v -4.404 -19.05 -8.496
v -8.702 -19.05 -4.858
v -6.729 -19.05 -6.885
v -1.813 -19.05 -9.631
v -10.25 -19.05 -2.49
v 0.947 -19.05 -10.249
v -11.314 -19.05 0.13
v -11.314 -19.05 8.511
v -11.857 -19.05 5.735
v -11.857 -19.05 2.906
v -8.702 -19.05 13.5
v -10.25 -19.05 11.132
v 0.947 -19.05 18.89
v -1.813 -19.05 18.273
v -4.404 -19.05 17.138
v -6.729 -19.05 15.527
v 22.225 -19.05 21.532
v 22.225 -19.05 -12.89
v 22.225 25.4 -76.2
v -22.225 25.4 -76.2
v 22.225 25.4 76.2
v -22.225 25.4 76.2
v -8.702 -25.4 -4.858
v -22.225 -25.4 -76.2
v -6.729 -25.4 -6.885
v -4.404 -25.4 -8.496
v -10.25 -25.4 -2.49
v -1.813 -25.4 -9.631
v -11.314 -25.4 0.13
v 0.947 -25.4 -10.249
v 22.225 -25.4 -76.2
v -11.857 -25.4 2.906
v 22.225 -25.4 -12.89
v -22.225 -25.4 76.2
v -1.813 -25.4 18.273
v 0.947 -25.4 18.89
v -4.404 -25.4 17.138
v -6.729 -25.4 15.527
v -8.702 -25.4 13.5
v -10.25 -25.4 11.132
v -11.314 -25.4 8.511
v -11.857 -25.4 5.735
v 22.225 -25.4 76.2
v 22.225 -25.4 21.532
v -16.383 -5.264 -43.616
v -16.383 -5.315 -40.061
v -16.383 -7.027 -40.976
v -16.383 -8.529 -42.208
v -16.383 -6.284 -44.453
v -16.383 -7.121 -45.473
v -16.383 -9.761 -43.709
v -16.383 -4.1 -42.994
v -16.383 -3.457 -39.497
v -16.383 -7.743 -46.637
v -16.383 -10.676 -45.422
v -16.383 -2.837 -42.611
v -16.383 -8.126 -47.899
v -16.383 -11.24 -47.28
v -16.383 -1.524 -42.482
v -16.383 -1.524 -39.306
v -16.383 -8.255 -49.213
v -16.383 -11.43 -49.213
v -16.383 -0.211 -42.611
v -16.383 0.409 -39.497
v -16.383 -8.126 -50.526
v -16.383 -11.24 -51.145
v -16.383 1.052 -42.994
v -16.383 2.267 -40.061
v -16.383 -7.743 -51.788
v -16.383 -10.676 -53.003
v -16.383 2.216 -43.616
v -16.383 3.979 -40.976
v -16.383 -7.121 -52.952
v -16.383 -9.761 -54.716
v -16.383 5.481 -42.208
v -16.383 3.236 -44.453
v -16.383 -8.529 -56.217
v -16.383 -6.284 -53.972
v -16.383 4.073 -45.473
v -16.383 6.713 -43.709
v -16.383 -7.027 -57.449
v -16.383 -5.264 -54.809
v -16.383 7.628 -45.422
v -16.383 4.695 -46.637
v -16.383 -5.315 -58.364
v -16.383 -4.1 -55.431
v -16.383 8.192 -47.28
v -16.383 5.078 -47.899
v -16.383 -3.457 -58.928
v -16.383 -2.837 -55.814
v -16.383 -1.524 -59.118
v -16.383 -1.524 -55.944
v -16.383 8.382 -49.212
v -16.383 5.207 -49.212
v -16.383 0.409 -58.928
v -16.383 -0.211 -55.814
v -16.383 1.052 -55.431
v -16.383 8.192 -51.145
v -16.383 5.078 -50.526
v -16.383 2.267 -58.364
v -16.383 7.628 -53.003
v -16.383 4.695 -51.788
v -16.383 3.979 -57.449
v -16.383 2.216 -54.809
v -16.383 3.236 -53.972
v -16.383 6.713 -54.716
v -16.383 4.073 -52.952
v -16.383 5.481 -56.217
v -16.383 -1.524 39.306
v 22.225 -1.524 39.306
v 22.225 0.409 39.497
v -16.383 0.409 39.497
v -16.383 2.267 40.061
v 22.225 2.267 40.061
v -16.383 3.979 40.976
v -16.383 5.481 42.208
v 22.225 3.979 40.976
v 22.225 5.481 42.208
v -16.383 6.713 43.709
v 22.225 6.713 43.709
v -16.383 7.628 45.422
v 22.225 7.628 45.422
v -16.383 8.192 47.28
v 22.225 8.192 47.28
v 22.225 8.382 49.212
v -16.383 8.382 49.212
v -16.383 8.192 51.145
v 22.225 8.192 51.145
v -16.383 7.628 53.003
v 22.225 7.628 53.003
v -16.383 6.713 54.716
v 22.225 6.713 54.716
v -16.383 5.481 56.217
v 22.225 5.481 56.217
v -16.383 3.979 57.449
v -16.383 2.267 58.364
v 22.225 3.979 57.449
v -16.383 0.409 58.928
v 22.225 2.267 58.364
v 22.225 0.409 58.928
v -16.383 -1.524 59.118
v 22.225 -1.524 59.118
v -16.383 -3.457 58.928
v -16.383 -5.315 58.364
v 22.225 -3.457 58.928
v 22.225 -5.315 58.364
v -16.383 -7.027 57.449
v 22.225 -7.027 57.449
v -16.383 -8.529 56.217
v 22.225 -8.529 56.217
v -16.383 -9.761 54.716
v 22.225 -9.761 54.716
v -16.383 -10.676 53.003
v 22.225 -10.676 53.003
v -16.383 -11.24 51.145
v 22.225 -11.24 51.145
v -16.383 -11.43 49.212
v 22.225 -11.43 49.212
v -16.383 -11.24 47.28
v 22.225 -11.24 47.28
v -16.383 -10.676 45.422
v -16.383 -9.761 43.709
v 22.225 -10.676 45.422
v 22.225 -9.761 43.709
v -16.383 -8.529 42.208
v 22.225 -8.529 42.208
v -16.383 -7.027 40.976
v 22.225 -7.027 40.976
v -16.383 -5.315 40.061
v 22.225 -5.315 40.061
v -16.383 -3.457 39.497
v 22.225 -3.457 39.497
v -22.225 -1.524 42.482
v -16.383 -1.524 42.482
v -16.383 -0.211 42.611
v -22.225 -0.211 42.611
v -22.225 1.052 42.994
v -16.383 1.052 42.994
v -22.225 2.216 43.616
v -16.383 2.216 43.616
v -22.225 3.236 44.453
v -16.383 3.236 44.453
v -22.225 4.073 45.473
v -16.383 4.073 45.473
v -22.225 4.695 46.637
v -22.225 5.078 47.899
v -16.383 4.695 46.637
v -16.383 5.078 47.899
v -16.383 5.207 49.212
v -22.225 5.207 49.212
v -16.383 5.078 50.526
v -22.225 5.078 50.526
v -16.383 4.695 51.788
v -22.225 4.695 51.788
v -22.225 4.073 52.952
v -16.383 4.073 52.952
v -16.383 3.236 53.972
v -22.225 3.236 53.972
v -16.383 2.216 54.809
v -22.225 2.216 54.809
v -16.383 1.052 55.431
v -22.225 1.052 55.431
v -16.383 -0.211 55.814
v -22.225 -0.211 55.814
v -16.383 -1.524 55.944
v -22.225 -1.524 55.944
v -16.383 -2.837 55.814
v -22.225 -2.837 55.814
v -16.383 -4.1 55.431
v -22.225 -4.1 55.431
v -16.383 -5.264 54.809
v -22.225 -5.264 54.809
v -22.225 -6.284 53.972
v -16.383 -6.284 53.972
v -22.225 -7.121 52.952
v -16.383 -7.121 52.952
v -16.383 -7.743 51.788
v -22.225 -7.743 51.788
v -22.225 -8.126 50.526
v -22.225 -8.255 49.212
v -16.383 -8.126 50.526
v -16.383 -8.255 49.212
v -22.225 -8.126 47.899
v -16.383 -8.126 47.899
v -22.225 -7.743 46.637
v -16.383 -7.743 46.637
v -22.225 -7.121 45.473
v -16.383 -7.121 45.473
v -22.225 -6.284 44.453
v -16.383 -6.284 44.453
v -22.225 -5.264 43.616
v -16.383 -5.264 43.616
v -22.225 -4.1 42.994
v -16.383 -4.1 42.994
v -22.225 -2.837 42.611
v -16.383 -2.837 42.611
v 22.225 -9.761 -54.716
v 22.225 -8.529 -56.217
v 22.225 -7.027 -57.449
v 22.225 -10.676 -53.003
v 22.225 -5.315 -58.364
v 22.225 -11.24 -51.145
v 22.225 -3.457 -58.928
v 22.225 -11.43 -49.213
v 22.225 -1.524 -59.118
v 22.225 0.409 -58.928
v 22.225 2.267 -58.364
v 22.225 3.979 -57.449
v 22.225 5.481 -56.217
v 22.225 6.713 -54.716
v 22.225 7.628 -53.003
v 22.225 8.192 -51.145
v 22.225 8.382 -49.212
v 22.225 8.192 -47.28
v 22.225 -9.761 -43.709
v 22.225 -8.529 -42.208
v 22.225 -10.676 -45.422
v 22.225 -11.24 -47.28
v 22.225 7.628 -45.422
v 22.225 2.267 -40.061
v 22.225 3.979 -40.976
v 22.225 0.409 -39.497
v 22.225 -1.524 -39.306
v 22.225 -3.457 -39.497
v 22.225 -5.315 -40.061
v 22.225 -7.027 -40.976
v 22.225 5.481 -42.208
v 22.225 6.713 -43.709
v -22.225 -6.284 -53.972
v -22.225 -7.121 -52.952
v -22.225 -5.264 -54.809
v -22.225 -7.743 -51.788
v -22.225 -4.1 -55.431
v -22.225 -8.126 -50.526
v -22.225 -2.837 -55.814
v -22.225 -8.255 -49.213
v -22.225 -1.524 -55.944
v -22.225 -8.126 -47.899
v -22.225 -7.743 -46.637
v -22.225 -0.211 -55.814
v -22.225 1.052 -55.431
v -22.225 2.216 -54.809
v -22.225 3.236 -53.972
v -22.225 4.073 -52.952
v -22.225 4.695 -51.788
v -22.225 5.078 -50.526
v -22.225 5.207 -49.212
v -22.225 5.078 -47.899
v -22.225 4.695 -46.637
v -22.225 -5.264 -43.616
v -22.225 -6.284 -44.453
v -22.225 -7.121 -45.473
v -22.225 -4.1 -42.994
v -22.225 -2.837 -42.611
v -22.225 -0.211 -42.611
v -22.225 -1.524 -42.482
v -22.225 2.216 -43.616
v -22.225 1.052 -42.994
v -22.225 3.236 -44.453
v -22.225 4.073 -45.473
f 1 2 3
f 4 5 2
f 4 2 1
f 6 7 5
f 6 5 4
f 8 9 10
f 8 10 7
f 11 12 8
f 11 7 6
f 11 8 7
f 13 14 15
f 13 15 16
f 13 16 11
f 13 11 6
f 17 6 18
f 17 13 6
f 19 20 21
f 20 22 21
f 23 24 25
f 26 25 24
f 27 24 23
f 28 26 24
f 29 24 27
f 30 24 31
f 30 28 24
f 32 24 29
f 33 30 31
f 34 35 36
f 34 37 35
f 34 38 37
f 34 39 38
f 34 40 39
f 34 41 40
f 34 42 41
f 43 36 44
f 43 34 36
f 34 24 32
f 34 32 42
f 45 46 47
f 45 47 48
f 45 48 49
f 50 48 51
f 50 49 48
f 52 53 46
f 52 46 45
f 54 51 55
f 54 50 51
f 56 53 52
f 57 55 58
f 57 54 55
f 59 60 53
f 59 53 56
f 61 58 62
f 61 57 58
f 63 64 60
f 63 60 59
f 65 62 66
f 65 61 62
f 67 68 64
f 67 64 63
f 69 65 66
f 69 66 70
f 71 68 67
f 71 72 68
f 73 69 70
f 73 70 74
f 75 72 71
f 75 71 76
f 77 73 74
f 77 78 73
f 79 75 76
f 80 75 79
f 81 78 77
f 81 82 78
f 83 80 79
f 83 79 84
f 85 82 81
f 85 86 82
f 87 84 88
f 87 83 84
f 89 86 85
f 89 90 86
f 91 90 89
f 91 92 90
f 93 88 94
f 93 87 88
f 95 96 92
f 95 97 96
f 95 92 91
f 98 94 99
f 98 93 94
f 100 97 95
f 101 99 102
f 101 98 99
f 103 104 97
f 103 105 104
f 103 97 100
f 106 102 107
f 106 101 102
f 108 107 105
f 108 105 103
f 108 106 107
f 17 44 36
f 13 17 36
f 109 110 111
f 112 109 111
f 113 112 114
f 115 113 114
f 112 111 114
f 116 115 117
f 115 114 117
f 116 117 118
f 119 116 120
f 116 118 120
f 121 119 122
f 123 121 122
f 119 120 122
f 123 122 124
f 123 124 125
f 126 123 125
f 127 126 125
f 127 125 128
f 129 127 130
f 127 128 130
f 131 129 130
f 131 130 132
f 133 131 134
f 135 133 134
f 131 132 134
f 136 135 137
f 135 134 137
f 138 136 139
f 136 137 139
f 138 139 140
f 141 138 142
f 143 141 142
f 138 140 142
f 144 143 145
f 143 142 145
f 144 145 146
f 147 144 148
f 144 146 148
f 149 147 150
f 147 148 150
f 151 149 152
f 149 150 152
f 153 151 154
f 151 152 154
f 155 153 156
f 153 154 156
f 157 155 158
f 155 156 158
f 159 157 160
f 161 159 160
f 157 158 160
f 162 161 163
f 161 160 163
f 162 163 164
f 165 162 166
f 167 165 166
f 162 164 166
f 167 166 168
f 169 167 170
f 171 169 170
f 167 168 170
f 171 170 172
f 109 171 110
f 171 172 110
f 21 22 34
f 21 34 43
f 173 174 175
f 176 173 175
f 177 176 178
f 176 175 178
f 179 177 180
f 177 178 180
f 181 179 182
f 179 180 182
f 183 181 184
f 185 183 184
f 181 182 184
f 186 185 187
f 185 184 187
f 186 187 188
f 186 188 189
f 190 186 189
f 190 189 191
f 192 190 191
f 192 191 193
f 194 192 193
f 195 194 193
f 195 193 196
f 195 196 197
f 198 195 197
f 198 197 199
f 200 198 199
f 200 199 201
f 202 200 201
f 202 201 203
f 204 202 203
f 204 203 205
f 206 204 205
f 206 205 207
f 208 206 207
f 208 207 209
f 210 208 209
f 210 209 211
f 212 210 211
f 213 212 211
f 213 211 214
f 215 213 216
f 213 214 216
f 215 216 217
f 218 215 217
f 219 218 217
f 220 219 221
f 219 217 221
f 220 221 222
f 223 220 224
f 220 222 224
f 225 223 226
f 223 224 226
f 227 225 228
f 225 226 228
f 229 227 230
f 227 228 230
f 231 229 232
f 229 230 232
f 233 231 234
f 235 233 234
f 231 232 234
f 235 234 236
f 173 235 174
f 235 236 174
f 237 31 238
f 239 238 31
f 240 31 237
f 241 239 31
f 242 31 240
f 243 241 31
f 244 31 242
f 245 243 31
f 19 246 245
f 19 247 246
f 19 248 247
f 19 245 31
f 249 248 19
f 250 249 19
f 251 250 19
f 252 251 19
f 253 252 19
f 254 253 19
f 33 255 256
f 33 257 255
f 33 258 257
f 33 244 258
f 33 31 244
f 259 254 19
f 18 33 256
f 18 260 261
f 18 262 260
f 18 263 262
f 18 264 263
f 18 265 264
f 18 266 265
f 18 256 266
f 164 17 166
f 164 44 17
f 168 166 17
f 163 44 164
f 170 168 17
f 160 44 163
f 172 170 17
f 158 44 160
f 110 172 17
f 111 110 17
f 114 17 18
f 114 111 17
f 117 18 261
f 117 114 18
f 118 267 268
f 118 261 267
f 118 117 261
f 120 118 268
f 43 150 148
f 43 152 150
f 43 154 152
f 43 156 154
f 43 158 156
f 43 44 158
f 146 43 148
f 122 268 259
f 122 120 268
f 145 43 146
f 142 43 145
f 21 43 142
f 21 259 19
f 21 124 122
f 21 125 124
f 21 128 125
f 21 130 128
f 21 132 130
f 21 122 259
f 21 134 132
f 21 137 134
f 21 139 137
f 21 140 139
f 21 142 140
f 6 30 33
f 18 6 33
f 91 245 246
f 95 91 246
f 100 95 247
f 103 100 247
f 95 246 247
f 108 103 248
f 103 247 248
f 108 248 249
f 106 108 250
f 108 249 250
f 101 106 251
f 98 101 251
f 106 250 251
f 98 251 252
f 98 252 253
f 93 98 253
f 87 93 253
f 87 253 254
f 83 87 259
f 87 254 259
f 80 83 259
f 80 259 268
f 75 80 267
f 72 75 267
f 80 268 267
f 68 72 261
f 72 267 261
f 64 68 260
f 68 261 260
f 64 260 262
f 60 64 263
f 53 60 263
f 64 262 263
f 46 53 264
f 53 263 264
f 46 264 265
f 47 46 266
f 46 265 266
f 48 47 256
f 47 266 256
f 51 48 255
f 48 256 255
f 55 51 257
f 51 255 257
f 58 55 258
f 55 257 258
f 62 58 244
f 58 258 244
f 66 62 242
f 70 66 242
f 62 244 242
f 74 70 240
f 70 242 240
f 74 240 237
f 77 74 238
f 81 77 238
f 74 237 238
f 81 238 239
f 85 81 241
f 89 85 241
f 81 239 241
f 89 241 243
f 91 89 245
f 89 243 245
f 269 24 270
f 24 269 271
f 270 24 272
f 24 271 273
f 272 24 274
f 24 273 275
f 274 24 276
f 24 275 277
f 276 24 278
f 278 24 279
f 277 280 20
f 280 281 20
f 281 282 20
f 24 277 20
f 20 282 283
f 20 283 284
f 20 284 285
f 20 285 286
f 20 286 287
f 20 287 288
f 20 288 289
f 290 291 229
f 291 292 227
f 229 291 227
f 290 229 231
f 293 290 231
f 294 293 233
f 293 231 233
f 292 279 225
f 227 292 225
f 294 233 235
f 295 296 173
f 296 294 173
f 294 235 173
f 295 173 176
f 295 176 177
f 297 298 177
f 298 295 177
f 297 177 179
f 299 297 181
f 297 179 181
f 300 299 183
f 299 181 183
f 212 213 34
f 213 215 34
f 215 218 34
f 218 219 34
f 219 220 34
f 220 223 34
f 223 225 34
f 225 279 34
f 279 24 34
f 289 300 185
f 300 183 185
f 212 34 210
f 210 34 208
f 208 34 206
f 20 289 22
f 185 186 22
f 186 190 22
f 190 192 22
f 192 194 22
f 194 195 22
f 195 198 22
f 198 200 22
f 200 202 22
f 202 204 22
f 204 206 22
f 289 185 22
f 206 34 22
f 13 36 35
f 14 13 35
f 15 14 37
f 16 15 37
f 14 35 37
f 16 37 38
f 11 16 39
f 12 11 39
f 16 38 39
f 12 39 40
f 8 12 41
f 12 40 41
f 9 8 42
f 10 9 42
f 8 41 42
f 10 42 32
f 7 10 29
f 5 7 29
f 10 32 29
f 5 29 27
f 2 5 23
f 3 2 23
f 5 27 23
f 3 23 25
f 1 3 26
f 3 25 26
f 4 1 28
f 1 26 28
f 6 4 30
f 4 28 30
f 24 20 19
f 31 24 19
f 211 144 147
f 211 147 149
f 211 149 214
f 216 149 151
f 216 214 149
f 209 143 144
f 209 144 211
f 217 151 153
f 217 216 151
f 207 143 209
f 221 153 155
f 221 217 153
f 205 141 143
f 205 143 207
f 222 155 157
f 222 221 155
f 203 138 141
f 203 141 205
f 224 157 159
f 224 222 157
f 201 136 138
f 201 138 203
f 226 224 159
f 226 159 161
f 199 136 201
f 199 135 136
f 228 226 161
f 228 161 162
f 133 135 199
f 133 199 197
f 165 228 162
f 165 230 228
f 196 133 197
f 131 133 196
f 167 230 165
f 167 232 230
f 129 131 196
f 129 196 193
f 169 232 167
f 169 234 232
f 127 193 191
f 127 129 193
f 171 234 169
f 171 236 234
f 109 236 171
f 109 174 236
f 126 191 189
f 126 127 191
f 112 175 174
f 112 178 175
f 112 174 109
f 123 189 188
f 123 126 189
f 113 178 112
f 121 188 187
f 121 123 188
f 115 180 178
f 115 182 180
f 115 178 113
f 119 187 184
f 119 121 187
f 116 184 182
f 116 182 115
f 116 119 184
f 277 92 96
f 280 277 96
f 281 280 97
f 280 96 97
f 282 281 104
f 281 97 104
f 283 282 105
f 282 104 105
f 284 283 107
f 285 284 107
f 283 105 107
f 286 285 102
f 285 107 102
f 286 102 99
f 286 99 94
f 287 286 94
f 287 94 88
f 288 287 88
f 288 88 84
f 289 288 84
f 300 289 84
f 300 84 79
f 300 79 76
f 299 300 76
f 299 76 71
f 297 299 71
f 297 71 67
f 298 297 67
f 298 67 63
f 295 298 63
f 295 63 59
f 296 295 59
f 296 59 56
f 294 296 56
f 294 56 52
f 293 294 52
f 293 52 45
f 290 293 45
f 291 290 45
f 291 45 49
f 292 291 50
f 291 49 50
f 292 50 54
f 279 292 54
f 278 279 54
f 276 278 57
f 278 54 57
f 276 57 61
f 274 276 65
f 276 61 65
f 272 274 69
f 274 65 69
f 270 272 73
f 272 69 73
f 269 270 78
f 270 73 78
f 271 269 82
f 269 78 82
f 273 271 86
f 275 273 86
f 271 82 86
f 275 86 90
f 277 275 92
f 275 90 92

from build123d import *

# Parameters (mm, degrees)
SKETCH1_W           = 44.45
SKETCH1_H           = 50.8
BOSS_EXTRUDE1_DEPTH = 76.2
CUT_EXTRUDE1_REACH  = 93.801
SKETCH2_R           = 6.731
SKETCH3_R           = 9.906
CUT_EXTRUDE2_DEPTH  = 38.608
CUT_EXTRUDE3_DEPTH  = 6.35


with BuildPart() as part:
    # Sketch1 → Boss-Extrude1 (new, symmetric)
    with BuildSketch(Plane.XY):
        Rectangle(SKETCH1_W, SKETCH1_H)
    extrude(amount=BOSS_EXTRUDE1_DEPTH, both=True)

    # Sketch2 → Cut-Extrude1 (cut, up to next)
    with BuildSketch(Plane(origin=(22.225, 0, 0), x_dir=(0, 0, -1), z_dir=(1, 0, 0)), mode=Mode.PRIVATE) as cut_extrude1_sk1:
        with Locations((-49.2125, -1.524)):
            Circle(SKETCH2_R)
    cut_extrude1_tool1 = extrude(cut_extrude1_sk1.sketch, amount=-CUT_EXTRUDE1_REACH, mode=Mode.PRIVATE) & part.part
    # Sketch2 → Cut-Extrude1 (cut, up to next)
    with BuildSketch(Plane(origin=(22.225, 0, 0), x_dir=(0, 0, -1), z_dir=(1, 0, 0)), mode=Mode.PRIVATE) as cut_extrude1_sk2:
        with Locations((49.2125, -1.524)):
            Circle(SKETCH2_R)
    cut_extrude1_tool2 = extrude(cut_extrude1_sk2.sketch, amount=-CUT_EXTRUDE1_REACH, mode=Mode.PRIVATE) & part.part
    add(cut_extrude1_tool1.solids().sort_by_distance((22.225, -1.524, 49.2125))[0], mode=Mode.SUBTRACT)
    add(cut_extrude1_tool2.solids().sort_by_distance((22.225, -1.524, -49.2125))[0], mode=Mode.SUBTRACT)

    # Sketch3 → Cut-Extrude2 (cut)
    with BuildSketch(Plane(origin=(22.225, 0, 0), x_dir=(0, 0, -1), z_dir=(1, 0, 0))):
        with Locations((-49.2125, -1.524)):
            Circle(SKETCH3_R)
        with Locations((49.2125, -1.524)):
            Circle(SKETCH3_R)
    extrude(amount=-CUT_EXTRUDE2_DEPTH, mode=Mode.SUBTRACT)

    # Sketch4 → Cut-Extrude3 (cut)
    with BuildSketch(Plane.XZ.offset(25.4)):
        with BuildLine():
            Line((22.225, -12.890241244), (22.225, 21.531765175))
            Line((22.225, 21.531765175), (0.947246364, 18.89010908))
            ThreePointArc((0.947246364, 18.89010908), (-11.925153457, 4.320761965), (0.947246364, -10.248585149))
            Line((0.947246364, -10.248585149), (22.225, -12.890241244))
        make_face()
    extrude(amount=-CUT_EXTRUDE3_DEPTH, mode=Mode.SUBTRACT)


solid = part.part
